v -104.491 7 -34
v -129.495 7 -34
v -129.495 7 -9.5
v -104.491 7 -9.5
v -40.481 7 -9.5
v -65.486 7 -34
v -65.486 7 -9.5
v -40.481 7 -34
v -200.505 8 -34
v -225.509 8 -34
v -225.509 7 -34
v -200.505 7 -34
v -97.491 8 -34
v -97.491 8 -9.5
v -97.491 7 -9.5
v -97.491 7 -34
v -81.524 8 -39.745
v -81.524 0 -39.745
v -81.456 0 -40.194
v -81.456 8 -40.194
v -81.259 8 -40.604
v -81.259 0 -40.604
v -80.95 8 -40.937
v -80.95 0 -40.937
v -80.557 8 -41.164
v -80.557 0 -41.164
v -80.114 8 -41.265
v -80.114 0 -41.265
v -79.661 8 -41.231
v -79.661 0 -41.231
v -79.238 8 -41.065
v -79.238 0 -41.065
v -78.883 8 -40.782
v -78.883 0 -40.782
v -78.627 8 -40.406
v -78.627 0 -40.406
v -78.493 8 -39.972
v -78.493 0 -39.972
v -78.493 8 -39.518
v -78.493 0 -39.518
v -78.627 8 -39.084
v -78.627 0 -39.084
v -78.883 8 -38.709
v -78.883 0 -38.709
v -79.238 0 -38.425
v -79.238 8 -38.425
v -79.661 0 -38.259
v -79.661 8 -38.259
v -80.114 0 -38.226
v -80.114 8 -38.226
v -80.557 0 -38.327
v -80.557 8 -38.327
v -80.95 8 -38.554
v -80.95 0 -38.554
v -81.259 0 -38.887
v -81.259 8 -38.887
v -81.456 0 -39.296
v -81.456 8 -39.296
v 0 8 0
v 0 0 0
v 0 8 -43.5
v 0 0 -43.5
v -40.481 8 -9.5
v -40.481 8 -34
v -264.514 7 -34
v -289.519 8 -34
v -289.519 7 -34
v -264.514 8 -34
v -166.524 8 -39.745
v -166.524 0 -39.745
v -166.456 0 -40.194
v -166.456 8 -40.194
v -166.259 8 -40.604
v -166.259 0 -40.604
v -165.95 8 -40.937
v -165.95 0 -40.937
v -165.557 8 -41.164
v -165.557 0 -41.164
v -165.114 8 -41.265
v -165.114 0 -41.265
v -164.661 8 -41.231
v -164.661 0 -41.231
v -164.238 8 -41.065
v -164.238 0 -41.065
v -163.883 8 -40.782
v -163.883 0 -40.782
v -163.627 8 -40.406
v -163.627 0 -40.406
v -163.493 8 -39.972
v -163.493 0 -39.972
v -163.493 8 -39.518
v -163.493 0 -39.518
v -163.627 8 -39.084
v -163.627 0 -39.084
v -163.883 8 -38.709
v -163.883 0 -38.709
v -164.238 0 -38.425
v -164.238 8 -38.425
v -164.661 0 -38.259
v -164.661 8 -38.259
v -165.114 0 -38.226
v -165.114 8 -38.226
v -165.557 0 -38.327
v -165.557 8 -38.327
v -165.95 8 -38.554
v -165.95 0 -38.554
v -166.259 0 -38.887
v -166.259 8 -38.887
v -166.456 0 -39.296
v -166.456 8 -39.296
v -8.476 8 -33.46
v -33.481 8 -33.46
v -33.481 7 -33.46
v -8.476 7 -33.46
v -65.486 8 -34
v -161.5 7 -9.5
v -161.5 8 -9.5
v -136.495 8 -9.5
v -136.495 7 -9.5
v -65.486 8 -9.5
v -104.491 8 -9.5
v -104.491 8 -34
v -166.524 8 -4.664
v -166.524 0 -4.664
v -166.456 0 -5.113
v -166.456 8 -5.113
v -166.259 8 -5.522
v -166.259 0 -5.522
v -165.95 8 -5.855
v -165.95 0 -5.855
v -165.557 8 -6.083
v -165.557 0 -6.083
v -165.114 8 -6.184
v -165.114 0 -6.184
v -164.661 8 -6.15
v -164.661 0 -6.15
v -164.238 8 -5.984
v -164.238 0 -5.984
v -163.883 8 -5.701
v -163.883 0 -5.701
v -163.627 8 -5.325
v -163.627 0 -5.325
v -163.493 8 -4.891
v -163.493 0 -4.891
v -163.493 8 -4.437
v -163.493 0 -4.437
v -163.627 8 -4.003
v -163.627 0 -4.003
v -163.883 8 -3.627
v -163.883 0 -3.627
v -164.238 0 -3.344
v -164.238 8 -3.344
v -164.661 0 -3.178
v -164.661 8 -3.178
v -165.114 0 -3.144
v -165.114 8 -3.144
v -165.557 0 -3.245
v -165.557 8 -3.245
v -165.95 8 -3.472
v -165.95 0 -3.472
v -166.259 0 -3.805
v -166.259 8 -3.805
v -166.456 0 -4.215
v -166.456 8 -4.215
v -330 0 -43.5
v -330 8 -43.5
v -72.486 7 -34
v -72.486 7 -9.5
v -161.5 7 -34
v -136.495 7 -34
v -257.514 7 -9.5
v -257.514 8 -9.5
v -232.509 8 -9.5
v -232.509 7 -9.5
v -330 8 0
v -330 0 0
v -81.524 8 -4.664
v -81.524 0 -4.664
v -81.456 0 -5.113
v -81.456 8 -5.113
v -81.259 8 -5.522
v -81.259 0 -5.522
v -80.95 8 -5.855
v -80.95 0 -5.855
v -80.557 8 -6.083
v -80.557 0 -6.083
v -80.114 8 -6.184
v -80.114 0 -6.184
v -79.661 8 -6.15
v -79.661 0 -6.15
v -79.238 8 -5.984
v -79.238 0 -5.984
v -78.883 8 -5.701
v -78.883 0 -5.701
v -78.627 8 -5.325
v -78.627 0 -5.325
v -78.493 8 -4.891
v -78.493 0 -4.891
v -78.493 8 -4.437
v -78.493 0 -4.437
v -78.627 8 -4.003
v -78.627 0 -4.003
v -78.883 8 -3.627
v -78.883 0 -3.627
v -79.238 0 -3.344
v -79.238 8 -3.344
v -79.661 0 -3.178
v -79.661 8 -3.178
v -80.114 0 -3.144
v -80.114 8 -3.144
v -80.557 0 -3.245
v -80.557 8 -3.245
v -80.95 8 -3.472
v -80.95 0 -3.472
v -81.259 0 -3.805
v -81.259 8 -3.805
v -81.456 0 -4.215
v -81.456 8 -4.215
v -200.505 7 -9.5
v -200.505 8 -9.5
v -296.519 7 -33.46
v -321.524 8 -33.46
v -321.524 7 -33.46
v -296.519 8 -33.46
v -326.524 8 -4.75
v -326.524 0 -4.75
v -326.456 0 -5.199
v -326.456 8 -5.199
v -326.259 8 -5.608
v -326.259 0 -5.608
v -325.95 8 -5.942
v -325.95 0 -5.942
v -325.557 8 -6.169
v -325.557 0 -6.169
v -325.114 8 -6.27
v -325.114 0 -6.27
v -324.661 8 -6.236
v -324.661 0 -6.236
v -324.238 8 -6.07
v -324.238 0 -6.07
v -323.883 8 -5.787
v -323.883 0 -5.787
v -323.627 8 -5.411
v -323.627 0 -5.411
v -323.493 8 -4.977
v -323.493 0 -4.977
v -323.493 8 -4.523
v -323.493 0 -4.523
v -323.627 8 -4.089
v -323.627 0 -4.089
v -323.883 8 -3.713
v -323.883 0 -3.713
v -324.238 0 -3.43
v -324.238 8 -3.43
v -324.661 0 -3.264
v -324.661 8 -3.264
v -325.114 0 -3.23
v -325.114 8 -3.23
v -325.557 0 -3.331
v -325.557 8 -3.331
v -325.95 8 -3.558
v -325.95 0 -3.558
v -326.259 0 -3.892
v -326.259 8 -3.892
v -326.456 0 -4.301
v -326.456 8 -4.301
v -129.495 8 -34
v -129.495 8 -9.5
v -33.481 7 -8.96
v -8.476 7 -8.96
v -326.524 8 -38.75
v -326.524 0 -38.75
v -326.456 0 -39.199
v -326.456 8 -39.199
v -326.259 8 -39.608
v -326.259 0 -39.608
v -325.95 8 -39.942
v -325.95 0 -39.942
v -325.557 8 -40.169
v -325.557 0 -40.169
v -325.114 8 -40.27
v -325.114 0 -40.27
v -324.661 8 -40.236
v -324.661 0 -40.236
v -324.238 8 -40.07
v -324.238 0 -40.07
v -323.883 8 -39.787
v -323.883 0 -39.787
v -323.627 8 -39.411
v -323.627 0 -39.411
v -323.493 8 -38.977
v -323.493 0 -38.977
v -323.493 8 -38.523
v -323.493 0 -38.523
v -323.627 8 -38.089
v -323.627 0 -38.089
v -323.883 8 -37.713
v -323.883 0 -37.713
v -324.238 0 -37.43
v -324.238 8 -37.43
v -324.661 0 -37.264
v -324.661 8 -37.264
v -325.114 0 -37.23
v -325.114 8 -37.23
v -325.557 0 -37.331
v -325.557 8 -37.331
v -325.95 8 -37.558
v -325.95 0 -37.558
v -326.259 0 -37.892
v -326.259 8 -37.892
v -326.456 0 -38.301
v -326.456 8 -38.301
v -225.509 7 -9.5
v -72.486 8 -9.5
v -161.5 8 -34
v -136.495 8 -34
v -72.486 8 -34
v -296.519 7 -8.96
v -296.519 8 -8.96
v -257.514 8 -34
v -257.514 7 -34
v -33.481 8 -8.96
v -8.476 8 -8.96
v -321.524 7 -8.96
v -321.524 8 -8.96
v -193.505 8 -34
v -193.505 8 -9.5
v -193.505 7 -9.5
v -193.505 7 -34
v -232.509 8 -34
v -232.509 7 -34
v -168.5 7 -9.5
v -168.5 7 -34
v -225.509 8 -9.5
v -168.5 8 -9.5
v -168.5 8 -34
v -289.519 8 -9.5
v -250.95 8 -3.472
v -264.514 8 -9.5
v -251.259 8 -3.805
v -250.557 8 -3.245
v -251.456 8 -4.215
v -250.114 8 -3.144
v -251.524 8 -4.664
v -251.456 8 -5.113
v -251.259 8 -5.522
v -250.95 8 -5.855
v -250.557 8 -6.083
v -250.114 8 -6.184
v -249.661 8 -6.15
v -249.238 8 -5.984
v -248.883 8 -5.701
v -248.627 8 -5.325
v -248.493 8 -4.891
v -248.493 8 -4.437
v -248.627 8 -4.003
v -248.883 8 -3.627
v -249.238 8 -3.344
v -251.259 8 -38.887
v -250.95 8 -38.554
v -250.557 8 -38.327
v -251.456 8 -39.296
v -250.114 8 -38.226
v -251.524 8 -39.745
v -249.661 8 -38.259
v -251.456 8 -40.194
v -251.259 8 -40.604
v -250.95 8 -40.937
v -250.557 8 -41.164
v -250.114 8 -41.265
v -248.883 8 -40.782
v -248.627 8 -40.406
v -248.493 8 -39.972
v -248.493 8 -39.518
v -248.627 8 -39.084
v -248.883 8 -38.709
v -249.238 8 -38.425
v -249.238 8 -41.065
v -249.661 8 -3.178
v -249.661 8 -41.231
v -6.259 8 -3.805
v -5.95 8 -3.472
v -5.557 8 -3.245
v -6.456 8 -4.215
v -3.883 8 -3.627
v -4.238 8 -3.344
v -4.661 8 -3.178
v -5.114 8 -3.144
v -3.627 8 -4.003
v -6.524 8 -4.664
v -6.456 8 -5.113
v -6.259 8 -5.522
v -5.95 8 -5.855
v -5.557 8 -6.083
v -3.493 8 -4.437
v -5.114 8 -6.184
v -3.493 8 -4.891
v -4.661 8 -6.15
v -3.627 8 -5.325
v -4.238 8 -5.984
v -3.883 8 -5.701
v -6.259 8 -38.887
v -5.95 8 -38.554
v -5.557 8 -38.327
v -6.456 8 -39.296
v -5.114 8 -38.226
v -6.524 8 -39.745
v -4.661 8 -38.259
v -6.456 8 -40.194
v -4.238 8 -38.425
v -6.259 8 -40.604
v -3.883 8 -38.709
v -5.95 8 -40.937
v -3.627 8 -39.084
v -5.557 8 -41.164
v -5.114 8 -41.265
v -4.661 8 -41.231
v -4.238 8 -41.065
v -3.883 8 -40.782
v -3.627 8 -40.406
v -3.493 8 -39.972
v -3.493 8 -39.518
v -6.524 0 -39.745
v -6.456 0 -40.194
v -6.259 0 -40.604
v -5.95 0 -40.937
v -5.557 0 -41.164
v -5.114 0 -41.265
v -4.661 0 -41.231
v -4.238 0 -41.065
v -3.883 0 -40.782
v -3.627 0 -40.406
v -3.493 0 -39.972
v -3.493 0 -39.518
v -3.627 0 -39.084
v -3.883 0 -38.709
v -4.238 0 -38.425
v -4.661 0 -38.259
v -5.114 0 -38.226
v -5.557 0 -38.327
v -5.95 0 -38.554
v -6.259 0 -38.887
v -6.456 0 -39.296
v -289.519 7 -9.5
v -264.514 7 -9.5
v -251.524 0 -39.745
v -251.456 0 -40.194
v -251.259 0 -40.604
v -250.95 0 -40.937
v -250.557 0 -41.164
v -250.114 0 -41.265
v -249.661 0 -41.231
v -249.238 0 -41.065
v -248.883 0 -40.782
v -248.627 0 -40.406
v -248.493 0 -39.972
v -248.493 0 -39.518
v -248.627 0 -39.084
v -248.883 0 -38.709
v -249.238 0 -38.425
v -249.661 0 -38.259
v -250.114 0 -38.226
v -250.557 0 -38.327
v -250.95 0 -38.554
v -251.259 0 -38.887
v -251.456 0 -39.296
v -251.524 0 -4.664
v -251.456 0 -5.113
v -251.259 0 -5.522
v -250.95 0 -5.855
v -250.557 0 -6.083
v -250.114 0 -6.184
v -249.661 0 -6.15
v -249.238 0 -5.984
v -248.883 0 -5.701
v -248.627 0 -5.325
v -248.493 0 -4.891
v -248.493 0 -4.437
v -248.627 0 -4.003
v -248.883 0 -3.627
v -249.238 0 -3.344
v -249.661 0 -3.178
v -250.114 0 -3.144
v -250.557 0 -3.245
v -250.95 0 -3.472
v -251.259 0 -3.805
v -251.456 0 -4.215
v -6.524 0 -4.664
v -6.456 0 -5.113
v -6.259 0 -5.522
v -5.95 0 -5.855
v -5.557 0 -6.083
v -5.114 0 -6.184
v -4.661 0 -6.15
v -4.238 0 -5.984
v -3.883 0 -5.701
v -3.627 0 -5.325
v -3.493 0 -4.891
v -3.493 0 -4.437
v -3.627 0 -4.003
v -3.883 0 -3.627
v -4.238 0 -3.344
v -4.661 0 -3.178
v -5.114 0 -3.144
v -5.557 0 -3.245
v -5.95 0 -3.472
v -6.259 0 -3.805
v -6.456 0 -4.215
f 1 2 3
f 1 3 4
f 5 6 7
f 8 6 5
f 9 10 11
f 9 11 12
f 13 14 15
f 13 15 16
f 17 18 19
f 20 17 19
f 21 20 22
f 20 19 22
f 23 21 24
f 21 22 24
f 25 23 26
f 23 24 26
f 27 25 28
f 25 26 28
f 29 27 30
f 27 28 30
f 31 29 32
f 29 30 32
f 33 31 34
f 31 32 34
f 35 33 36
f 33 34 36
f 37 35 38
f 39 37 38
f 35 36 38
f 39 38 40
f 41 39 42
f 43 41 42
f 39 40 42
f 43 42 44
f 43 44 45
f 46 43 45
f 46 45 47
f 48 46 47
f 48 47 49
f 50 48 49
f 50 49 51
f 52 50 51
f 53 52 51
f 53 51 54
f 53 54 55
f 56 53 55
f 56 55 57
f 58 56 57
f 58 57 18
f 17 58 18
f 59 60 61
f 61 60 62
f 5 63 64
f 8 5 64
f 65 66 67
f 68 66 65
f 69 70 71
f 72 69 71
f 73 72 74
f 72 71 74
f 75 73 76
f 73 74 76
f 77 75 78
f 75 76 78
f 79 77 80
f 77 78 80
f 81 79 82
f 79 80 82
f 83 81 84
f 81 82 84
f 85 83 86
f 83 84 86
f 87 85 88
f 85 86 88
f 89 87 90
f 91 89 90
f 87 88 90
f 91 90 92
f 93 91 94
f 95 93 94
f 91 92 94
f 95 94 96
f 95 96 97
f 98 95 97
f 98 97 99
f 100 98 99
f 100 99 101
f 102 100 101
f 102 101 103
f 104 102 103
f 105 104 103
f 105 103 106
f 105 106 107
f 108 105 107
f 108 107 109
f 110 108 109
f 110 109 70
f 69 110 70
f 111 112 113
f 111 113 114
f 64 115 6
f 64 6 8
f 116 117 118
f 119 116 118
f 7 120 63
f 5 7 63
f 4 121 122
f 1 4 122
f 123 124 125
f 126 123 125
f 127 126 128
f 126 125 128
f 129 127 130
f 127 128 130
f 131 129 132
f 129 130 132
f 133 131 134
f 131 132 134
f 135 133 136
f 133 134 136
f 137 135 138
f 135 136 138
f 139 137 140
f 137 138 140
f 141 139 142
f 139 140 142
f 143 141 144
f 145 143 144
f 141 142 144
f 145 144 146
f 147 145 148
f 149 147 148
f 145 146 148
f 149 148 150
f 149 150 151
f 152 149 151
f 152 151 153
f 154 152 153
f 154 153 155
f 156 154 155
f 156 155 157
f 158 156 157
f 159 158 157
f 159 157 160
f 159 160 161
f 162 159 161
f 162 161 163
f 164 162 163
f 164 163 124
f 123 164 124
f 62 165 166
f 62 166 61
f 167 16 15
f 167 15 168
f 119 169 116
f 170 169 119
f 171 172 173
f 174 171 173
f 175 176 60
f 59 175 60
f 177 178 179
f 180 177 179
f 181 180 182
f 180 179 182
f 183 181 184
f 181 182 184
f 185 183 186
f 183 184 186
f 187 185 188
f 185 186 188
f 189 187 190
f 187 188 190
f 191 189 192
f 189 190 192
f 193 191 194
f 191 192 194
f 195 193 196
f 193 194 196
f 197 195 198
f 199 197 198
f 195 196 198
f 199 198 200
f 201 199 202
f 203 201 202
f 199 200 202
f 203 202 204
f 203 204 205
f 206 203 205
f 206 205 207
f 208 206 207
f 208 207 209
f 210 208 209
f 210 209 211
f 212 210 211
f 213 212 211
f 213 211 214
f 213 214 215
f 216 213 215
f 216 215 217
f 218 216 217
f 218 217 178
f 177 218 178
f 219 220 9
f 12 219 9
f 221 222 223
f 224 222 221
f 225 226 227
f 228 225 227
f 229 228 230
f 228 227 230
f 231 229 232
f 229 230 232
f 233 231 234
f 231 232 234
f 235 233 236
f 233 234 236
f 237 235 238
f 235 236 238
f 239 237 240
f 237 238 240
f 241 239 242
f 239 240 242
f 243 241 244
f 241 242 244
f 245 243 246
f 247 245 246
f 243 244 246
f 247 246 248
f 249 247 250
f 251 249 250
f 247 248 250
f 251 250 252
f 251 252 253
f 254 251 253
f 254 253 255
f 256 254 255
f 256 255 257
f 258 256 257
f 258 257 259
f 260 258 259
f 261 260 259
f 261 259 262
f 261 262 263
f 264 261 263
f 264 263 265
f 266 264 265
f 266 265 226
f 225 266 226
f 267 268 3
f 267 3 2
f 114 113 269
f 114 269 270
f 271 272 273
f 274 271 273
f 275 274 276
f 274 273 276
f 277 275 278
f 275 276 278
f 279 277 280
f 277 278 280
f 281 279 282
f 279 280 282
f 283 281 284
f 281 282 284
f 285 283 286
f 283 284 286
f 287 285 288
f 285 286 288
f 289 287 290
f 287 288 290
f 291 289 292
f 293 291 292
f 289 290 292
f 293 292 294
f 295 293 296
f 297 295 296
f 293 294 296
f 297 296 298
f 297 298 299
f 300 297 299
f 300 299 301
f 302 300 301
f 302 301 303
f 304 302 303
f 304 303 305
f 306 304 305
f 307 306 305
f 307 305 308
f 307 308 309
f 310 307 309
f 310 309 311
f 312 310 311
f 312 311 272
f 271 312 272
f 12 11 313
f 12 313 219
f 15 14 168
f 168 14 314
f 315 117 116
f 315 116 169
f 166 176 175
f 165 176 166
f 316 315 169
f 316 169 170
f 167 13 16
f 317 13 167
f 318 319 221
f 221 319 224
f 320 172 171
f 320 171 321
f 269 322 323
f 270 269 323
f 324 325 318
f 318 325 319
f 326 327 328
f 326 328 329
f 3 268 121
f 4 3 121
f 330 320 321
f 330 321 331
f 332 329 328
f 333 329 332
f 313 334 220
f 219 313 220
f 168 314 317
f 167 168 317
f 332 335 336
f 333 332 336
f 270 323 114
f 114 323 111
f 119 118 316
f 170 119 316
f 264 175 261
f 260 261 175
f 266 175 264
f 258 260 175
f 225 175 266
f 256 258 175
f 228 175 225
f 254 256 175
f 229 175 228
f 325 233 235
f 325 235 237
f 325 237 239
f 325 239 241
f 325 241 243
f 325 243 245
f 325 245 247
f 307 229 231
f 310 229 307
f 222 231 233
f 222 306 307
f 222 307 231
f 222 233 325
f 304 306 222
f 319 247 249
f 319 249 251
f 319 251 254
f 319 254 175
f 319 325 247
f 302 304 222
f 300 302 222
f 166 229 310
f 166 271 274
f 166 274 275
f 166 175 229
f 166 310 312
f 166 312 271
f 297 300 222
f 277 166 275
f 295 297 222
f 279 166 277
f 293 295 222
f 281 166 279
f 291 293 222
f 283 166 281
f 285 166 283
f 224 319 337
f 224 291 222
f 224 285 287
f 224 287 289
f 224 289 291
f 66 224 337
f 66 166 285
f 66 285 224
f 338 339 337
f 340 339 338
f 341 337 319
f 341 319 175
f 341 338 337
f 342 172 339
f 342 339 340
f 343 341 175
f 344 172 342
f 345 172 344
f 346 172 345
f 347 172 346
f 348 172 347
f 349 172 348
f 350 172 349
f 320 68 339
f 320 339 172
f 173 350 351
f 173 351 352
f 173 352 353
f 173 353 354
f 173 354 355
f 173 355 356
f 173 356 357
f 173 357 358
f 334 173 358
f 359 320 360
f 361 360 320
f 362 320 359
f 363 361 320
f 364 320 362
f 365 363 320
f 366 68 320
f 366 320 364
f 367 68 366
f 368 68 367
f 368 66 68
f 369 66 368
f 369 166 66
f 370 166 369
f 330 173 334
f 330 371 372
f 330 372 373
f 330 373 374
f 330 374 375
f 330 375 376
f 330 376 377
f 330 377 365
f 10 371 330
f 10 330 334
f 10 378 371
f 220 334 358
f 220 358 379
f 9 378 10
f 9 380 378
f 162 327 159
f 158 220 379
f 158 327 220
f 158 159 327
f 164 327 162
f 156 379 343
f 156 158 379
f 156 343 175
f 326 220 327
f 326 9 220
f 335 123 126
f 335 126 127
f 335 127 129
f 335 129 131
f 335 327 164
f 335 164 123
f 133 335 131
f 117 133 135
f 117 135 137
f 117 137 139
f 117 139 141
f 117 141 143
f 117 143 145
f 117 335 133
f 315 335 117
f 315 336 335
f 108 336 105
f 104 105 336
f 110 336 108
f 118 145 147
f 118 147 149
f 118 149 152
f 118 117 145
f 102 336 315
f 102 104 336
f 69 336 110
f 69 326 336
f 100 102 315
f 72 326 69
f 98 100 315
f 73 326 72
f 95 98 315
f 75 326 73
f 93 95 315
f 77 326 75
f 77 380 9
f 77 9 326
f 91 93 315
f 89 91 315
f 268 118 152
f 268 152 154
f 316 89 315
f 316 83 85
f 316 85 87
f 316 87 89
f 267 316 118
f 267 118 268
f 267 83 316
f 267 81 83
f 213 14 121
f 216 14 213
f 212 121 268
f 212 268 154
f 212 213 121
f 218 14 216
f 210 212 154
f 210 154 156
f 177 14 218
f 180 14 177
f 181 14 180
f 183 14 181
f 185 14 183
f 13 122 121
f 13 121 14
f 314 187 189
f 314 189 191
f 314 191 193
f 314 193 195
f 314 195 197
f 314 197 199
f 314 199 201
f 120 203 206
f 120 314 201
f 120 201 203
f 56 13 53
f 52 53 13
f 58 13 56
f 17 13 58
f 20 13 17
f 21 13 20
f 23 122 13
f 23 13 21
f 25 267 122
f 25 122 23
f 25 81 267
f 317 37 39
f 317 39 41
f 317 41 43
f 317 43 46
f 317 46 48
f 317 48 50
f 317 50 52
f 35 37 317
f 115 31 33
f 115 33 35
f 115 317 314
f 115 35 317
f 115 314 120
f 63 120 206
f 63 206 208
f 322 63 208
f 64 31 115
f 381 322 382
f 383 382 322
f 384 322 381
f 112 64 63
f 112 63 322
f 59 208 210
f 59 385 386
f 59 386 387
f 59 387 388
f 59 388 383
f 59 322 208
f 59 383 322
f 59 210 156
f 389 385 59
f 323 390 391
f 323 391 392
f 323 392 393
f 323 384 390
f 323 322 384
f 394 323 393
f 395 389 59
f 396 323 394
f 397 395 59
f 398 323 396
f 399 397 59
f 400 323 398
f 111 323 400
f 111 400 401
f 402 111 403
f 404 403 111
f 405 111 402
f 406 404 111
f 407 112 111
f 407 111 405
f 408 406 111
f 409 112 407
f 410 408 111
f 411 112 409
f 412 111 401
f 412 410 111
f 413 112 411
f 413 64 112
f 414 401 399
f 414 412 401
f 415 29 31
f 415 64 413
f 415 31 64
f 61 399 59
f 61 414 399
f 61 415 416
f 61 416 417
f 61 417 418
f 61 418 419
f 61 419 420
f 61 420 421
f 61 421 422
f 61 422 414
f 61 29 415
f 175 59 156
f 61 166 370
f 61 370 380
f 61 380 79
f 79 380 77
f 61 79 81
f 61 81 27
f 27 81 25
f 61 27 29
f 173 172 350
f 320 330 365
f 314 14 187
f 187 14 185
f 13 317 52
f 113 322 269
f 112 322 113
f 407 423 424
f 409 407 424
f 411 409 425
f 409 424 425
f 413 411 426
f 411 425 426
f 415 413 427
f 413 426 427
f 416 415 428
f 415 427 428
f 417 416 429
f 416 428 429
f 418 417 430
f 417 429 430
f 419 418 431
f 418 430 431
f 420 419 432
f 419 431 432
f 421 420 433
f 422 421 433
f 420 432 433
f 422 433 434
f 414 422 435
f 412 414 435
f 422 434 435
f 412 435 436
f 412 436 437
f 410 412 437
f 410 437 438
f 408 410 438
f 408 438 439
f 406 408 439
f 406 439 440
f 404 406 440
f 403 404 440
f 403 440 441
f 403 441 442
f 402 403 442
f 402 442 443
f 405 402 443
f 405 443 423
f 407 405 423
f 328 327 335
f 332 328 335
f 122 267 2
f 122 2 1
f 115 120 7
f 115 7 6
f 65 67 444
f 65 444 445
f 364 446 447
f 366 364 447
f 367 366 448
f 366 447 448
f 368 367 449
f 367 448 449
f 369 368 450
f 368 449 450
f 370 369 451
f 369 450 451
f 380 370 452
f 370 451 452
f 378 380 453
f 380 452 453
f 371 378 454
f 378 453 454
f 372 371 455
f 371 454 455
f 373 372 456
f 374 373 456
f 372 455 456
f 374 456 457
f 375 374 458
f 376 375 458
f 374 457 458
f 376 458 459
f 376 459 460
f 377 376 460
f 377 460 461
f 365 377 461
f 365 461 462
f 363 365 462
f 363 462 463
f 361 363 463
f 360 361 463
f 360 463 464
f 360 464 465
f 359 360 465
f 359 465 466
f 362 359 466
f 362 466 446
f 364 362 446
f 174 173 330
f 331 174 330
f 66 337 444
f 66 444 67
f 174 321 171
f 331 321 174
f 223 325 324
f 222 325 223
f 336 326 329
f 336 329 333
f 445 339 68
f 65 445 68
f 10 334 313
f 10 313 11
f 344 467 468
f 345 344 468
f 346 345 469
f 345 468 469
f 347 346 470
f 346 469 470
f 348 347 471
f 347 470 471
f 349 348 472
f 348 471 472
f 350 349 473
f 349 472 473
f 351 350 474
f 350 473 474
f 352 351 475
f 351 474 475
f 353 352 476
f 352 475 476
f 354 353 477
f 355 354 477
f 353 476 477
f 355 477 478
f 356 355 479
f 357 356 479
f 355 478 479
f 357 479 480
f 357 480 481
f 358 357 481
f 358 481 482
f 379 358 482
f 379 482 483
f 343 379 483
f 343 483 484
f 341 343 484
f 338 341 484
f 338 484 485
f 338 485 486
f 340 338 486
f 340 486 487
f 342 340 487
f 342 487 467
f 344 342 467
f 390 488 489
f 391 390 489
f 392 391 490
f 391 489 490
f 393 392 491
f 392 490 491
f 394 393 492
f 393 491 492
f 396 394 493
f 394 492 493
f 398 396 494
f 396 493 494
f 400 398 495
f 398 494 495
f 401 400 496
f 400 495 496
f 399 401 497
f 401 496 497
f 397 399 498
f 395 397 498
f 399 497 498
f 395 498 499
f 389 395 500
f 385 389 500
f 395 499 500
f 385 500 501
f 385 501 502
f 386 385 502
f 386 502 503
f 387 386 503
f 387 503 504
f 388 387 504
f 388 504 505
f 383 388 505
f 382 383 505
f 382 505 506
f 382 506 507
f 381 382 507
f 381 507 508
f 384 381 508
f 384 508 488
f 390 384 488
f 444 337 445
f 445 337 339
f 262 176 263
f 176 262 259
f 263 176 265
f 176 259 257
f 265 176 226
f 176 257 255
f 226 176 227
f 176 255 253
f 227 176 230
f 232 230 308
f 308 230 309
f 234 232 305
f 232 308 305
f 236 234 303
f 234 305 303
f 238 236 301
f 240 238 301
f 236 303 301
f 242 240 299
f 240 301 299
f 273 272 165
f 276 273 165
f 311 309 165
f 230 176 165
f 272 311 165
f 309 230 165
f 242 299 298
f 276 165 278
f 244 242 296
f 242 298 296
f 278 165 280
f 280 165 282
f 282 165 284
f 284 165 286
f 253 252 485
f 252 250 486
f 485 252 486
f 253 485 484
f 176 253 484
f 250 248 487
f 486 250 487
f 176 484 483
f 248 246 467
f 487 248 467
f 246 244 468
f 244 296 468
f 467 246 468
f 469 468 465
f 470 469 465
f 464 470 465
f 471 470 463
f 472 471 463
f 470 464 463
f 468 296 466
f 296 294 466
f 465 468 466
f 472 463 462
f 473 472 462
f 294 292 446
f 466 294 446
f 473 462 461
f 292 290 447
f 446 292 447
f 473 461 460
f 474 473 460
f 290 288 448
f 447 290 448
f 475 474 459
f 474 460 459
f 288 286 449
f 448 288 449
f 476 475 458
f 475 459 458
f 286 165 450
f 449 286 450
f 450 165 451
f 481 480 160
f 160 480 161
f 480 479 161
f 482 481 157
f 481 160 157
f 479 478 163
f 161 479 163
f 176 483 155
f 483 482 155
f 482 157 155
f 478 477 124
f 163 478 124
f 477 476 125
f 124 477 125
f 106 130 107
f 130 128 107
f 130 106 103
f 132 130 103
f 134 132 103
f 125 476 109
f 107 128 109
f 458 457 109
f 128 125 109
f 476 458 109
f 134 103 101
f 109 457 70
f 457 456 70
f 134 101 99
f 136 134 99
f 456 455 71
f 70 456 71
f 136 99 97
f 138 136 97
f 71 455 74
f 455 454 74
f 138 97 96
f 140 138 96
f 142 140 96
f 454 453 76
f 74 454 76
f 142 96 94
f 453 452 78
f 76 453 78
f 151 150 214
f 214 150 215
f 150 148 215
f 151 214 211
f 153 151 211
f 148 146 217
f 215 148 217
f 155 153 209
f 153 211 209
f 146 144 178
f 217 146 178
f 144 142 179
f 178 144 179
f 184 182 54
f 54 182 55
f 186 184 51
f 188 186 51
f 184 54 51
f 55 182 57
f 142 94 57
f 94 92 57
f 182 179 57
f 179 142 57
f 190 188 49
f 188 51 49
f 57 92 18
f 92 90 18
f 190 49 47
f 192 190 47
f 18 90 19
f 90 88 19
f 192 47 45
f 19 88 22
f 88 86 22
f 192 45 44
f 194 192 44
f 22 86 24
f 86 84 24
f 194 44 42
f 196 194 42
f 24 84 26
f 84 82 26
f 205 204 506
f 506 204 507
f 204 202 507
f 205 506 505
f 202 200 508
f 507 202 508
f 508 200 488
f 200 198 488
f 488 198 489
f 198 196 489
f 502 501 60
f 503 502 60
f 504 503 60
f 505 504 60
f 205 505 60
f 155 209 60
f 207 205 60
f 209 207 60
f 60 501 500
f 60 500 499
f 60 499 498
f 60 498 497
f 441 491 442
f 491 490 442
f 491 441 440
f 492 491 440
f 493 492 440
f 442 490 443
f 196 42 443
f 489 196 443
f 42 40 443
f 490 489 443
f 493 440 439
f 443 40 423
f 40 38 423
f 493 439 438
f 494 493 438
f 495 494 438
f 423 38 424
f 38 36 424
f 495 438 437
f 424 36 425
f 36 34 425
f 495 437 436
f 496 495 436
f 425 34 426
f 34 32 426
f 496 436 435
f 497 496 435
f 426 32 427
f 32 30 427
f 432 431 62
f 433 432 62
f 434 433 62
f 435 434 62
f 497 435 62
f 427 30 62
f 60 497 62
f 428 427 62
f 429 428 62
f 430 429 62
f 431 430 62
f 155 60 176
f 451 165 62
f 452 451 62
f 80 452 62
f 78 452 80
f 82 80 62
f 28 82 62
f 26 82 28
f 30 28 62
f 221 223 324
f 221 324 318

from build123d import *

# Parameters (mm, degrees)
SKETCH1_W                        = 330
SKETCH1_H                        = 43.5
BOSS_EXTRUDE1_DEPTH              = 8
SKETCH6_W                        = 25.004721381
SKETCH6_H                        = 24.5
SKETCH6_W_2                      = 25.004721382
CUT_EXTRUDE1_DEPTH               = 1
TAPPED_HOLE_FOR_4_40_HELICOIL2_D = 3.048


with BuildPart() as part:
    # Sketch1 → Boss-Extrude1 (new body)
    with BuildSketch(Plane(origin=(0, 0, 0), x_dir=(1, 0, 0), z_dir=(0, 1, 0))):
        with Locations((-165, 21.75)):
            Rectangle(SKETCH1_W, SKETCH1_H)
    extrude(amount=BOSS_EXTRUDE1_DEPTH)

    # Sketch6 → Cut-Extrude1 (cut)
    with BuildSketch(Plane(origin=(0, 8, 0), x_dir=(1, 0, 0), z_dir=(0, 1, 0))):
        with Locations((-213.007082072, 21.75)):
            Rectangle(SKETCH6_W, SKETCH6_H)
        with Locations((-181.002360691, 21.75)):
            Rectangle(SKETCH6_W_2, SKETCH6_H)
        with Locations((-245.011803454, 21.75)):
            Rectangle(SKETCH6_W_2, SKETCH6_H)
        with Locations((-277.016524836, 21.75)):
            Rectangle(SKETCH6_W_2, SKETCH6_H)
        with Locations((-309.021246217, 21.209761144)):
            Rectangle(SKETCH6_W, SKETCH6_H)
        with Locations((-148.997639309, 21.75)):
            Rectangle(SKETCH6_W_2, SKETCH6_H)
        with Locations((-116.992917928, 21.75)):
            Rectangle(SKETCH6_W, SKETCH6_H)
        with Locations((-84.988196546, 21.75)):
            Rectangle(SKETCH6_W_2, SKETCH6_H)
        with Locations((-52.983475164, 21.75)):
            Rectangle(SKETCH6_W_2, SKETCH6_H)
        with Locations((-20.978753783, 21.209761144)):
            Rectangle(SKETCH6_W, SKETCH6_H)
    extrude(amount=-CUT_EXTRUDE1_DEPTH, mode=Mode.SUBTRACT)

    # Tapped Hole for #4-40 Helicoil2 (through all)
    with Locations(Plane(origin=(0, 8, 0), x_dir=(1, 0, 0), z_dir=(0, 1, 0))):
        with Locations((-165, 39.745256998), (-165, 4.663980245), (-250, 4.663980245), (-325, 4.75), (-325, 38.75), (-250, 39.745256998), (-80, 39.745256998), (-80, 4.663980245), (-5, 4.663980245), (-5, 39.745256998)):
            Hole(TAPPED_HOLE_FOR_4_40_HELICOIL2_D / 2)


solid = part.part
